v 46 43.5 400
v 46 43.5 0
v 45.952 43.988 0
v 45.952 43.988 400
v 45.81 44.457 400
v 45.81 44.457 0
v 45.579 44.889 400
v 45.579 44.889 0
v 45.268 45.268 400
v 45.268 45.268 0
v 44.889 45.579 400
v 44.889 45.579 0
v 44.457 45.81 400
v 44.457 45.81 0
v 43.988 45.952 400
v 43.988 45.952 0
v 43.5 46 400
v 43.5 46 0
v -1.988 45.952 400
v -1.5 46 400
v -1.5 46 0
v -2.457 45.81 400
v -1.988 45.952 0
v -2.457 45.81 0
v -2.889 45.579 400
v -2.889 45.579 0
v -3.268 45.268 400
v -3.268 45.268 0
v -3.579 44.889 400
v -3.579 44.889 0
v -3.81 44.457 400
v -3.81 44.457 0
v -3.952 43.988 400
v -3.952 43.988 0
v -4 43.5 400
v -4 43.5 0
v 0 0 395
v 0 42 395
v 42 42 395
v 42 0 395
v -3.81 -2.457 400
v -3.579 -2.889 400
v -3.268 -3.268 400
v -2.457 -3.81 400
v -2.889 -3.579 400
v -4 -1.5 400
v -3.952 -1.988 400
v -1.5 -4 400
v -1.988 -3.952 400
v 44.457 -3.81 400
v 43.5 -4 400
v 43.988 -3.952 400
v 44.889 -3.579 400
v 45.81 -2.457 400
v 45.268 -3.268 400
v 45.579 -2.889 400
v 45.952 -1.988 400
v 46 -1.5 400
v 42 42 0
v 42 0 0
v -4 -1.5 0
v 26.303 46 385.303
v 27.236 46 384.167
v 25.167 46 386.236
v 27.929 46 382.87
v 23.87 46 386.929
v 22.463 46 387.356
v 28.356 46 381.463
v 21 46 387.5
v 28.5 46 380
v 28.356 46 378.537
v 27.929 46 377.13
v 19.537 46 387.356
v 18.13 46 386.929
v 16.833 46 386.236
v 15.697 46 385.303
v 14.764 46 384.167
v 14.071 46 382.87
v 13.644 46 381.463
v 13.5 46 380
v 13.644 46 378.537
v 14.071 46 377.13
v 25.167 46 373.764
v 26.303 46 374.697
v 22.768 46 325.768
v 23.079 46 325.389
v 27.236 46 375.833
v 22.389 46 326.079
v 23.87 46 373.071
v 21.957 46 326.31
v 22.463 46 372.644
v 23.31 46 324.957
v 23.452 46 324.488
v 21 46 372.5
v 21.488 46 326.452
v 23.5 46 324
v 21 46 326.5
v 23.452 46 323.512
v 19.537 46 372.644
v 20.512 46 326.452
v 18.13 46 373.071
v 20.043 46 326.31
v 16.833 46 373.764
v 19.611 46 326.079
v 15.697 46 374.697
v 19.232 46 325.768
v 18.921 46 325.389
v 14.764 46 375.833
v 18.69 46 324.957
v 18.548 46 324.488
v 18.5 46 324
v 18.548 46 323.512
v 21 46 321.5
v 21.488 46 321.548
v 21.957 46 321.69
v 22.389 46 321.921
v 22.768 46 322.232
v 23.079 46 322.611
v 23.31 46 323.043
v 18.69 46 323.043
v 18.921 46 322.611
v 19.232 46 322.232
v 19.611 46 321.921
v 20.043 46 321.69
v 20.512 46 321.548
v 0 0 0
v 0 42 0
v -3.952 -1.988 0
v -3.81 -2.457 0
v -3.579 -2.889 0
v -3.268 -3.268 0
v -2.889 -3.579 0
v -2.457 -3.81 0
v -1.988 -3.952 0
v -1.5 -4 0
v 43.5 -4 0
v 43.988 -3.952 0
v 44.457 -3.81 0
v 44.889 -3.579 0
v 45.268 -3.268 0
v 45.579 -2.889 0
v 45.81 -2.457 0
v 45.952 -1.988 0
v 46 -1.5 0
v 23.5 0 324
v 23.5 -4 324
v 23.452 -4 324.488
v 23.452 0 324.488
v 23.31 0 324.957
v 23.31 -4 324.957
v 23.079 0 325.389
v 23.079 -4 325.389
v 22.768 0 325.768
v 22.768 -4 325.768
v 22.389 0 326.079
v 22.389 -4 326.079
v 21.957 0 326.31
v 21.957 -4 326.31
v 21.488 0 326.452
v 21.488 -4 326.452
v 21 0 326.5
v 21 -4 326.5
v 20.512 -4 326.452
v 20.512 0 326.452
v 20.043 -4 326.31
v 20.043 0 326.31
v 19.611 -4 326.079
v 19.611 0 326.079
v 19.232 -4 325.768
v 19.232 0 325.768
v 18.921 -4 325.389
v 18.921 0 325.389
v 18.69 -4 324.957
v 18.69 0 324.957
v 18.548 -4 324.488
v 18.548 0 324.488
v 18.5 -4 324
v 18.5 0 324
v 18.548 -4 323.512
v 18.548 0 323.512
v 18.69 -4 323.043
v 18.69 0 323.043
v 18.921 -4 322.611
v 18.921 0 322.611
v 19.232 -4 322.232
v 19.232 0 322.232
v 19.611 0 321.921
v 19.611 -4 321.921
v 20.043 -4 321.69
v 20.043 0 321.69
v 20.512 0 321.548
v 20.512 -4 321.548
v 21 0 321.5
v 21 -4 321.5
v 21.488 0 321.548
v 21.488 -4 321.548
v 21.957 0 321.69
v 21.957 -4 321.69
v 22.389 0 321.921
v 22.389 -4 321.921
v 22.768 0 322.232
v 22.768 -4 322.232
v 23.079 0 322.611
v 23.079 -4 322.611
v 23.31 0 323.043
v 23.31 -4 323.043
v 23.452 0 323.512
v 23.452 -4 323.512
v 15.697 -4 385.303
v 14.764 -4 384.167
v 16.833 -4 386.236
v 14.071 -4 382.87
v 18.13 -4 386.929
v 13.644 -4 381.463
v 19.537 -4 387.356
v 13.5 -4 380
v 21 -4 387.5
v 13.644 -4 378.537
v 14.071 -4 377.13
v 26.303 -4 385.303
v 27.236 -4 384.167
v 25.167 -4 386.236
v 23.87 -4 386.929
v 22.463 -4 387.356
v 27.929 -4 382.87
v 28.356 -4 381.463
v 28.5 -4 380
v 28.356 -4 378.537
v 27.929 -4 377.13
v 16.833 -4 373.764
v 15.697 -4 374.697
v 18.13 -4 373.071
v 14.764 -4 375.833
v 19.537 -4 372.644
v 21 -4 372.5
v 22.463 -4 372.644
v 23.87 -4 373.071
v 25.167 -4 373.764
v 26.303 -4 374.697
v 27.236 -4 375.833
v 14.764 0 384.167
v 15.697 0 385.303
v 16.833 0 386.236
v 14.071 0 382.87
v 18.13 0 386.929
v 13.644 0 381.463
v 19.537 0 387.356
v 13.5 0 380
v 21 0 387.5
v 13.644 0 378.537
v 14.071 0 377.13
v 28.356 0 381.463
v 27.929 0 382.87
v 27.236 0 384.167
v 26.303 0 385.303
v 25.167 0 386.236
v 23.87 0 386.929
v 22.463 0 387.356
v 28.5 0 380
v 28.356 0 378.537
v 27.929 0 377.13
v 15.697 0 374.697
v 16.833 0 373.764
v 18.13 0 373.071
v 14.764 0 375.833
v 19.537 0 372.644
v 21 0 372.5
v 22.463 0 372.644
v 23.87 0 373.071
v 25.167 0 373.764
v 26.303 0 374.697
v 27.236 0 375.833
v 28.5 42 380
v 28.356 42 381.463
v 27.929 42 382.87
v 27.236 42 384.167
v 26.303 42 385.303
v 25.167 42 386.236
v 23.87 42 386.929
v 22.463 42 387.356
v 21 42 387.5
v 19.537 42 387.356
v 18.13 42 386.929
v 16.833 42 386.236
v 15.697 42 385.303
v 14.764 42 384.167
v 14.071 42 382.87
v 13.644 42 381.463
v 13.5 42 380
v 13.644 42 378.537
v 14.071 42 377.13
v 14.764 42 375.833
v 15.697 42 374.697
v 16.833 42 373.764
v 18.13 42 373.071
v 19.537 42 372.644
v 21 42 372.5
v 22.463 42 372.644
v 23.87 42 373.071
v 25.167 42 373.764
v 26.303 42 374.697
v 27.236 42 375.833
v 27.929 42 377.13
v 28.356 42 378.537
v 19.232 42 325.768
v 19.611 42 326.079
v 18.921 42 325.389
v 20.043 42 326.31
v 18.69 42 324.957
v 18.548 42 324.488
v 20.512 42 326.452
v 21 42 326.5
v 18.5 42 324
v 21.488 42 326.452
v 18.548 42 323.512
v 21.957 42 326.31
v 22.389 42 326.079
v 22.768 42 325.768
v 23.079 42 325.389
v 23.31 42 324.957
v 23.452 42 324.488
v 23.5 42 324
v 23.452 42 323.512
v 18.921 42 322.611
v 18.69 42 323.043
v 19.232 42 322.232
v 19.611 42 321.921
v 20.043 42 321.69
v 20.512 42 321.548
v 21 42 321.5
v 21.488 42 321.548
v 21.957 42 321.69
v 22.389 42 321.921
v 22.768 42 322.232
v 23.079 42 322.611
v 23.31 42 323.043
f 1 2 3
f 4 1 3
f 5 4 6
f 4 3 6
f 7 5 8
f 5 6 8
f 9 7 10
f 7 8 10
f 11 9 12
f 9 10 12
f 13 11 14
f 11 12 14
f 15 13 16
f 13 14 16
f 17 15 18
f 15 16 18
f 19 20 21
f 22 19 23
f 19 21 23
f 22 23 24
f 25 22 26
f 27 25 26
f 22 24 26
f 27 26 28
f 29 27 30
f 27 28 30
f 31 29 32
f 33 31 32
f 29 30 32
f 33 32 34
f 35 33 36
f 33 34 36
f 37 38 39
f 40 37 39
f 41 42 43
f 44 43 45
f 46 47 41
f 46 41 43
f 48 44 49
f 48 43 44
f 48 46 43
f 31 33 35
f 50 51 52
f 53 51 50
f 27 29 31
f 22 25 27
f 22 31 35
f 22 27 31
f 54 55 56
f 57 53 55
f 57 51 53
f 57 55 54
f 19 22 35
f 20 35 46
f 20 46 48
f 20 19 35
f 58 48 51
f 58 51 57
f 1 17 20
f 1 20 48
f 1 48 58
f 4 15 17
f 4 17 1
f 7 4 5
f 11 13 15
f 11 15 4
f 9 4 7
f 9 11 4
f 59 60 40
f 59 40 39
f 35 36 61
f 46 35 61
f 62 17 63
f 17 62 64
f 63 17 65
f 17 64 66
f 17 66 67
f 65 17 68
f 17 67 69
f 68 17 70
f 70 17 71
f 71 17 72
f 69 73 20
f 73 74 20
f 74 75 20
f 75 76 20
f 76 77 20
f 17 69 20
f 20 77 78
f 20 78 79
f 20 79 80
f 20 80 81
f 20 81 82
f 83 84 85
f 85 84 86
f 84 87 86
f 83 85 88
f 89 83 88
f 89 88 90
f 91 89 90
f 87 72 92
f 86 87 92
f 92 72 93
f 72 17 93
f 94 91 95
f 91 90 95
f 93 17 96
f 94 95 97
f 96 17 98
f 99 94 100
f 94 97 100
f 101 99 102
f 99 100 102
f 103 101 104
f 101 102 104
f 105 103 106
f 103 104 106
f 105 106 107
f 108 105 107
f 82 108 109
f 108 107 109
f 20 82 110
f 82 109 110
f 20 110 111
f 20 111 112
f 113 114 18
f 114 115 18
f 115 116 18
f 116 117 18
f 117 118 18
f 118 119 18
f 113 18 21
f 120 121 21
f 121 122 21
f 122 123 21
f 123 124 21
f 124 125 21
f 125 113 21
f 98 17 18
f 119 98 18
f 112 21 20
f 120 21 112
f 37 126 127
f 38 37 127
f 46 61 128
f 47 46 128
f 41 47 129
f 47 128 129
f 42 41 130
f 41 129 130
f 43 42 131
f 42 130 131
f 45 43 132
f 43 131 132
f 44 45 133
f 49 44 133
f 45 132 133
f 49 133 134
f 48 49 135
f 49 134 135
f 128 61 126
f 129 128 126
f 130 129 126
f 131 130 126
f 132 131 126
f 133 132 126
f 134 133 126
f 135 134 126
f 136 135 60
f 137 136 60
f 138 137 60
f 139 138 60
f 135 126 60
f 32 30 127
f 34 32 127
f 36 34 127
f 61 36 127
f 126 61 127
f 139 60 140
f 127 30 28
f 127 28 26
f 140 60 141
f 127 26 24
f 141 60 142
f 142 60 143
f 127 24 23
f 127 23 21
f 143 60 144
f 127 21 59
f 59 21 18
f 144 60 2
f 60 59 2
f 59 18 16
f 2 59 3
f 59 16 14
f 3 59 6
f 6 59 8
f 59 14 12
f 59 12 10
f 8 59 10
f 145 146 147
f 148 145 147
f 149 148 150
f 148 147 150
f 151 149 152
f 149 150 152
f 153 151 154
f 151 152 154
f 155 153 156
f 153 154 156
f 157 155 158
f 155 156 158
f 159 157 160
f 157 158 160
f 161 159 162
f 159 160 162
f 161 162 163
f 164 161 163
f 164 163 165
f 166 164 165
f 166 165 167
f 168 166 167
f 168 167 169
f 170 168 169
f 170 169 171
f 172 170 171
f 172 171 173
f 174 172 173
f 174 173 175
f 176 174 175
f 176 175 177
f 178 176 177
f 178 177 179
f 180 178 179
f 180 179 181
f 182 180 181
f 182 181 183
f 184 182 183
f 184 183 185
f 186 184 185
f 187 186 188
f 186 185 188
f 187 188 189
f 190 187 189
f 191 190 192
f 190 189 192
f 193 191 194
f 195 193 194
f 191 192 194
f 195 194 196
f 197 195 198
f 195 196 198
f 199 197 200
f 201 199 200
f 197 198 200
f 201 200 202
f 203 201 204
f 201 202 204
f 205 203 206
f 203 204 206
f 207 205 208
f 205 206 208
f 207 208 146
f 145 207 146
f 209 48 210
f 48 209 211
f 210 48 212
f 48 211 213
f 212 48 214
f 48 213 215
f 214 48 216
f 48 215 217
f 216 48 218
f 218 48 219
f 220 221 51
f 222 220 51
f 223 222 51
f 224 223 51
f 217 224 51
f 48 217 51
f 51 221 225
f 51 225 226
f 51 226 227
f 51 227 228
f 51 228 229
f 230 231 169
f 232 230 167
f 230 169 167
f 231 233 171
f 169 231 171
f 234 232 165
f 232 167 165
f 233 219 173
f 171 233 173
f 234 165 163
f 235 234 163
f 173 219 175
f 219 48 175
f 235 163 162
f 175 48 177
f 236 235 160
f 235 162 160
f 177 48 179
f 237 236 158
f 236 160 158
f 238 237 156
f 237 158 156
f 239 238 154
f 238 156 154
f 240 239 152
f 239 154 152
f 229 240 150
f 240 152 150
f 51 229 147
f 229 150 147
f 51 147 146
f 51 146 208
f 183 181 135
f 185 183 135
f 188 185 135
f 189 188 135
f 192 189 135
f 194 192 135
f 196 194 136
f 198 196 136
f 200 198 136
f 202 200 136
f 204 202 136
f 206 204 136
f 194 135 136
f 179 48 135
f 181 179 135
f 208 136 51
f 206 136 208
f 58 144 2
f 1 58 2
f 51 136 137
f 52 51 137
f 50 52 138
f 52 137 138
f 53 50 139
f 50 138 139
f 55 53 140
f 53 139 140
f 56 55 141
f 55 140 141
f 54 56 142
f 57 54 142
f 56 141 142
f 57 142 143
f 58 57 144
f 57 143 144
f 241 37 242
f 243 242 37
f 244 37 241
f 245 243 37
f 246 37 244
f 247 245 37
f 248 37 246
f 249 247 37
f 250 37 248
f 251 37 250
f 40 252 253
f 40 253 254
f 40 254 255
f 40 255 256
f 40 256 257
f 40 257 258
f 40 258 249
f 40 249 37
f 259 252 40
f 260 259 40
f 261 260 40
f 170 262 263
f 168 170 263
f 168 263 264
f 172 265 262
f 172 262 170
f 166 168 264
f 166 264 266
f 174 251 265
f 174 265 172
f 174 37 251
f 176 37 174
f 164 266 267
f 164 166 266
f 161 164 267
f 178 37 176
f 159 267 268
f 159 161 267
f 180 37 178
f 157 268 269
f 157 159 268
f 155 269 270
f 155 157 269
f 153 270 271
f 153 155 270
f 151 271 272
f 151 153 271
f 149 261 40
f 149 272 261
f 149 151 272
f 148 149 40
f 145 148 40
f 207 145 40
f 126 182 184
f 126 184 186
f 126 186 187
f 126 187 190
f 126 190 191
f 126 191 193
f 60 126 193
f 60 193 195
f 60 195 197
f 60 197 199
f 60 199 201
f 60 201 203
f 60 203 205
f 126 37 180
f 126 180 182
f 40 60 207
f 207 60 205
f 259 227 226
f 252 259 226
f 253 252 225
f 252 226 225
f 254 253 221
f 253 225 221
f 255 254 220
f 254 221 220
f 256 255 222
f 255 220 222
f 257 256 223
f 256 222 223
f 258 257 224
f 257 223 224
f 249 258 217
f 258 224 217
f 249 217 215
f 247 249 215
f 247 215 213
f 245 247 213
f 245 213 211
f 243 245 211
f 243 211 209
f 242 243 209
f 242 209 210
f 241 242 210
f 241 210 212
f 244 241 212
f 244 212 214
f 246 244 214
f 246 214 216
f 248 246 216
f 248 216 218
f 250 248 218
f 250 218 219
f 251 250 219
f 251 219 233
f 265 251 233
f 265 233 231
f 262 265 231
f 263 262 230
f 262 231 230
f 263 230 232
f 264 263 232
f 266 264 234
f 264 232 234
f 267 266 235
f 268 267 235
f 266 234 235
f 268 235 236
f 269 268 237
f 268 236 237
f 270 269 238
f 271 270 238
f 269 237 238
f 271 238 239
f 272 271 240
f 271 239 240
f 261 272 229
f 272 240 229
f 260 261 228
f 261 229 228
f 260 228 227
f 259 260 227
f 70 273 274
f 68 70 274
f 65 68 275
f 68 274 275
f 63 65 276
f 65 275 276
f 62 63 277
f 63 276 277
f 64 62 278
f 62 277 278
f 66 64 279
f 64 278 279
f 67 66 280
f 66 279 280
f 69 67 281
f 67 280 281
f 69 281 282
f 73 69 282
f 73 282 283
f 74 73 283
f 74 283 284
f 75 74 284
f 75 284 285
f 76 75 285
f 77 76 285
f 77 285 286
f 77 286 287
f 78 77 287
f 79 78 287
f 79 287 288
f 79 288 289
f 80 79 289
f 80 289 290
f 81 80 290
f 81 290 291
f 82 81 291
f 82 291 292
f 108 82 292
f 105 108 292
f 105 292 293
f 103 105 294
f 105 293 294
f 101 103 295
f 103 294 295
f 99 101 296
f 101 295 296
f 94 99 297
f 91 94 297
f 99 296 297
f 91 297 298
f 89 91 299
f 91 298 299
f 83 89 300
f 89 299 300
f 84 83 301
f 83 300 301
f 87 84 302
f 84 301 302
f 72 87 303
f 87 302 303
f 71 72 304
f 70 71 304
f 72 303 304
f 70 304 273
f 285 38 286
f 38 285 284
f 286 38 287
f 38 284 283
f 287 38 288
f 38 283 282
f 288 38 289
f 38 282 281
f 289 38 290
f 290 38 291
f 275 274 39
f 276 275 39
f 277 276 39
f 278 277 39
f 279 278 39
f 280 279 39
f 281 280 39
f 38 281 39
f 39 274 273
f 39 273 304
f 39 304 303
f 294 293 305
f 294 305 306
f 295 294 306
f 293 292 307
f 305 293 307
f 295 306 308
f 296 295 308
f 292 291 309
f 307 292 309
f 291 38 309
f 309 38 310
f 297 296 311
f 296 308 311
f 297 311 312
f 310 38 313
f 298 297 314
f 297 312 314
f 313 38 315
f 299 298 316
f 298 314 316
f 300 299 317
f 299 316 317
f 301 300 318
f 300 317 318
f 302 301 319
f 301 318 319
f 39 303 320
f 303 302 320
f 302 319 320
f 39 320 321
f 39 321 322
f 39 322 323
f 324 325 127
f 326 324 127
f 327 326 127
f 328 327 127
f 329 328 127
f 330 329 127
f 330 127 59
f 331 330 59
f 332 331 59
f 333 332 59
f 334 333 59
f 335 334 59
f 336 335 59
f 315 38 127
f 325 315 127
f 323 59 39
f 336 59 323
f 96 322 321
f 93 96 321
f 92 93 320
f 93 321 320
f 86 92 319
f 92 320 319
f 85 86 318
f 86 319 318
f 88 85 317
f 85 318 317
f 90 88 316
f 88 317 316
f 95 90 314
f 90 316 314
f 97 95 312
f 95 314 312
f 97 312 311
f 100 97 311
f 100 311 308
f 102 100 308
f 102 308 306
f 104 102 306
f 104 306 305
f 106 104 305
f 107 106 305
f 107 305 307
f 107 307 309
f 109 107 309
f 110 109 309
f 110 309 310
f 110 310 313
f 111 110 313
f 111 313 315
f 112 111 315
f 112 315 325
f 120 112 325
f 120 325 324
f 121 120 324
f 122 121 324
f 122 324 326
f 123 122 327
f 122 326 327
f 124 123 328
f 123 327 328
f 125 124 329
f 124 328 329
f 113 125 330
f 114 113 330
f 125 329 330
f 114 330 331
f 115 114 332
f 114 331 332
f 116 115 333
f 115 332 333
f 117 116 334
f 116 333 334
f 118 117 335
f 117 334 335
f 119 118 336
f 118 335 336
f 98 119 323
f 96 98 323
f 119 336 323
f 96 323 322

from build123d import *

# Parameters (mm, degrees)
F0_W     = 42
F0_H     = 42
F1_DEPTH = 400
F2_R     = 7.5
F3_DEPTH = 50
F4_W     = 42
F4_H     = 42
F5_DEPTH = 5
F6_R     = 2.5
F7_DEPTH = 50


with BuildPart() as f1:
    # F0 (on Top) → F1 (new body)
    with BuildSketch(Plane.XY):
        with BuildLine():
            Line((43.5, 46), (-1.5, 46))
            ThreePointArc((-1.5, 46), (-3.267767, 45.267767), (-4, 43.5))
            Line((-4, 43.5), (-4, -1.5))
            ThreePointArc((-4, -1.5), (-3.267767, -3.267767), (-1.5, -4))
            Line((-1.5, -4), (43.5, -4))
            ThreePointArc((43.5, -4), (45.267767, -3.267767), (46, -1.5))
            Line((46, -1.5), (46, 43.5))
            ThreePointArc((46, 43.5), (45.267767, 45.267767), (43.5, 46))
        make_face()
        with Locations((21, 21)):
            Rectangle(F0_W, F0_H, mode=Mode.SUBTRACT)
    extrude(amount=F1_DEPTH)

    # F2 (on face) → F3 (cut)
    with BuildSketch(Plane.XZ.offset(4)):
        with Locations((21, 380)):
            Circle(F2_R)
    extrude(amount=-F3_DEPTH, mode=Mode.SUBTRACT)

    # F4 (on face) → F5 (join)
    with BuildSketch(Plane.XY.offset(400)):
        with Locations((21, 21)):
            Rectangle(F4_W, F4_H)
    extrude(amount=-F5_DEPTH)

    # F6 (on face) → F7 (cut)
    with BuildSketch(Plane.XZ.offset(4)):
        with Locations((21, 324)):
            Circle(F6_R)
    extrude(amount=-F7_DEPTH, mode=Mode.SUBTRACT)


solid = f1.part
